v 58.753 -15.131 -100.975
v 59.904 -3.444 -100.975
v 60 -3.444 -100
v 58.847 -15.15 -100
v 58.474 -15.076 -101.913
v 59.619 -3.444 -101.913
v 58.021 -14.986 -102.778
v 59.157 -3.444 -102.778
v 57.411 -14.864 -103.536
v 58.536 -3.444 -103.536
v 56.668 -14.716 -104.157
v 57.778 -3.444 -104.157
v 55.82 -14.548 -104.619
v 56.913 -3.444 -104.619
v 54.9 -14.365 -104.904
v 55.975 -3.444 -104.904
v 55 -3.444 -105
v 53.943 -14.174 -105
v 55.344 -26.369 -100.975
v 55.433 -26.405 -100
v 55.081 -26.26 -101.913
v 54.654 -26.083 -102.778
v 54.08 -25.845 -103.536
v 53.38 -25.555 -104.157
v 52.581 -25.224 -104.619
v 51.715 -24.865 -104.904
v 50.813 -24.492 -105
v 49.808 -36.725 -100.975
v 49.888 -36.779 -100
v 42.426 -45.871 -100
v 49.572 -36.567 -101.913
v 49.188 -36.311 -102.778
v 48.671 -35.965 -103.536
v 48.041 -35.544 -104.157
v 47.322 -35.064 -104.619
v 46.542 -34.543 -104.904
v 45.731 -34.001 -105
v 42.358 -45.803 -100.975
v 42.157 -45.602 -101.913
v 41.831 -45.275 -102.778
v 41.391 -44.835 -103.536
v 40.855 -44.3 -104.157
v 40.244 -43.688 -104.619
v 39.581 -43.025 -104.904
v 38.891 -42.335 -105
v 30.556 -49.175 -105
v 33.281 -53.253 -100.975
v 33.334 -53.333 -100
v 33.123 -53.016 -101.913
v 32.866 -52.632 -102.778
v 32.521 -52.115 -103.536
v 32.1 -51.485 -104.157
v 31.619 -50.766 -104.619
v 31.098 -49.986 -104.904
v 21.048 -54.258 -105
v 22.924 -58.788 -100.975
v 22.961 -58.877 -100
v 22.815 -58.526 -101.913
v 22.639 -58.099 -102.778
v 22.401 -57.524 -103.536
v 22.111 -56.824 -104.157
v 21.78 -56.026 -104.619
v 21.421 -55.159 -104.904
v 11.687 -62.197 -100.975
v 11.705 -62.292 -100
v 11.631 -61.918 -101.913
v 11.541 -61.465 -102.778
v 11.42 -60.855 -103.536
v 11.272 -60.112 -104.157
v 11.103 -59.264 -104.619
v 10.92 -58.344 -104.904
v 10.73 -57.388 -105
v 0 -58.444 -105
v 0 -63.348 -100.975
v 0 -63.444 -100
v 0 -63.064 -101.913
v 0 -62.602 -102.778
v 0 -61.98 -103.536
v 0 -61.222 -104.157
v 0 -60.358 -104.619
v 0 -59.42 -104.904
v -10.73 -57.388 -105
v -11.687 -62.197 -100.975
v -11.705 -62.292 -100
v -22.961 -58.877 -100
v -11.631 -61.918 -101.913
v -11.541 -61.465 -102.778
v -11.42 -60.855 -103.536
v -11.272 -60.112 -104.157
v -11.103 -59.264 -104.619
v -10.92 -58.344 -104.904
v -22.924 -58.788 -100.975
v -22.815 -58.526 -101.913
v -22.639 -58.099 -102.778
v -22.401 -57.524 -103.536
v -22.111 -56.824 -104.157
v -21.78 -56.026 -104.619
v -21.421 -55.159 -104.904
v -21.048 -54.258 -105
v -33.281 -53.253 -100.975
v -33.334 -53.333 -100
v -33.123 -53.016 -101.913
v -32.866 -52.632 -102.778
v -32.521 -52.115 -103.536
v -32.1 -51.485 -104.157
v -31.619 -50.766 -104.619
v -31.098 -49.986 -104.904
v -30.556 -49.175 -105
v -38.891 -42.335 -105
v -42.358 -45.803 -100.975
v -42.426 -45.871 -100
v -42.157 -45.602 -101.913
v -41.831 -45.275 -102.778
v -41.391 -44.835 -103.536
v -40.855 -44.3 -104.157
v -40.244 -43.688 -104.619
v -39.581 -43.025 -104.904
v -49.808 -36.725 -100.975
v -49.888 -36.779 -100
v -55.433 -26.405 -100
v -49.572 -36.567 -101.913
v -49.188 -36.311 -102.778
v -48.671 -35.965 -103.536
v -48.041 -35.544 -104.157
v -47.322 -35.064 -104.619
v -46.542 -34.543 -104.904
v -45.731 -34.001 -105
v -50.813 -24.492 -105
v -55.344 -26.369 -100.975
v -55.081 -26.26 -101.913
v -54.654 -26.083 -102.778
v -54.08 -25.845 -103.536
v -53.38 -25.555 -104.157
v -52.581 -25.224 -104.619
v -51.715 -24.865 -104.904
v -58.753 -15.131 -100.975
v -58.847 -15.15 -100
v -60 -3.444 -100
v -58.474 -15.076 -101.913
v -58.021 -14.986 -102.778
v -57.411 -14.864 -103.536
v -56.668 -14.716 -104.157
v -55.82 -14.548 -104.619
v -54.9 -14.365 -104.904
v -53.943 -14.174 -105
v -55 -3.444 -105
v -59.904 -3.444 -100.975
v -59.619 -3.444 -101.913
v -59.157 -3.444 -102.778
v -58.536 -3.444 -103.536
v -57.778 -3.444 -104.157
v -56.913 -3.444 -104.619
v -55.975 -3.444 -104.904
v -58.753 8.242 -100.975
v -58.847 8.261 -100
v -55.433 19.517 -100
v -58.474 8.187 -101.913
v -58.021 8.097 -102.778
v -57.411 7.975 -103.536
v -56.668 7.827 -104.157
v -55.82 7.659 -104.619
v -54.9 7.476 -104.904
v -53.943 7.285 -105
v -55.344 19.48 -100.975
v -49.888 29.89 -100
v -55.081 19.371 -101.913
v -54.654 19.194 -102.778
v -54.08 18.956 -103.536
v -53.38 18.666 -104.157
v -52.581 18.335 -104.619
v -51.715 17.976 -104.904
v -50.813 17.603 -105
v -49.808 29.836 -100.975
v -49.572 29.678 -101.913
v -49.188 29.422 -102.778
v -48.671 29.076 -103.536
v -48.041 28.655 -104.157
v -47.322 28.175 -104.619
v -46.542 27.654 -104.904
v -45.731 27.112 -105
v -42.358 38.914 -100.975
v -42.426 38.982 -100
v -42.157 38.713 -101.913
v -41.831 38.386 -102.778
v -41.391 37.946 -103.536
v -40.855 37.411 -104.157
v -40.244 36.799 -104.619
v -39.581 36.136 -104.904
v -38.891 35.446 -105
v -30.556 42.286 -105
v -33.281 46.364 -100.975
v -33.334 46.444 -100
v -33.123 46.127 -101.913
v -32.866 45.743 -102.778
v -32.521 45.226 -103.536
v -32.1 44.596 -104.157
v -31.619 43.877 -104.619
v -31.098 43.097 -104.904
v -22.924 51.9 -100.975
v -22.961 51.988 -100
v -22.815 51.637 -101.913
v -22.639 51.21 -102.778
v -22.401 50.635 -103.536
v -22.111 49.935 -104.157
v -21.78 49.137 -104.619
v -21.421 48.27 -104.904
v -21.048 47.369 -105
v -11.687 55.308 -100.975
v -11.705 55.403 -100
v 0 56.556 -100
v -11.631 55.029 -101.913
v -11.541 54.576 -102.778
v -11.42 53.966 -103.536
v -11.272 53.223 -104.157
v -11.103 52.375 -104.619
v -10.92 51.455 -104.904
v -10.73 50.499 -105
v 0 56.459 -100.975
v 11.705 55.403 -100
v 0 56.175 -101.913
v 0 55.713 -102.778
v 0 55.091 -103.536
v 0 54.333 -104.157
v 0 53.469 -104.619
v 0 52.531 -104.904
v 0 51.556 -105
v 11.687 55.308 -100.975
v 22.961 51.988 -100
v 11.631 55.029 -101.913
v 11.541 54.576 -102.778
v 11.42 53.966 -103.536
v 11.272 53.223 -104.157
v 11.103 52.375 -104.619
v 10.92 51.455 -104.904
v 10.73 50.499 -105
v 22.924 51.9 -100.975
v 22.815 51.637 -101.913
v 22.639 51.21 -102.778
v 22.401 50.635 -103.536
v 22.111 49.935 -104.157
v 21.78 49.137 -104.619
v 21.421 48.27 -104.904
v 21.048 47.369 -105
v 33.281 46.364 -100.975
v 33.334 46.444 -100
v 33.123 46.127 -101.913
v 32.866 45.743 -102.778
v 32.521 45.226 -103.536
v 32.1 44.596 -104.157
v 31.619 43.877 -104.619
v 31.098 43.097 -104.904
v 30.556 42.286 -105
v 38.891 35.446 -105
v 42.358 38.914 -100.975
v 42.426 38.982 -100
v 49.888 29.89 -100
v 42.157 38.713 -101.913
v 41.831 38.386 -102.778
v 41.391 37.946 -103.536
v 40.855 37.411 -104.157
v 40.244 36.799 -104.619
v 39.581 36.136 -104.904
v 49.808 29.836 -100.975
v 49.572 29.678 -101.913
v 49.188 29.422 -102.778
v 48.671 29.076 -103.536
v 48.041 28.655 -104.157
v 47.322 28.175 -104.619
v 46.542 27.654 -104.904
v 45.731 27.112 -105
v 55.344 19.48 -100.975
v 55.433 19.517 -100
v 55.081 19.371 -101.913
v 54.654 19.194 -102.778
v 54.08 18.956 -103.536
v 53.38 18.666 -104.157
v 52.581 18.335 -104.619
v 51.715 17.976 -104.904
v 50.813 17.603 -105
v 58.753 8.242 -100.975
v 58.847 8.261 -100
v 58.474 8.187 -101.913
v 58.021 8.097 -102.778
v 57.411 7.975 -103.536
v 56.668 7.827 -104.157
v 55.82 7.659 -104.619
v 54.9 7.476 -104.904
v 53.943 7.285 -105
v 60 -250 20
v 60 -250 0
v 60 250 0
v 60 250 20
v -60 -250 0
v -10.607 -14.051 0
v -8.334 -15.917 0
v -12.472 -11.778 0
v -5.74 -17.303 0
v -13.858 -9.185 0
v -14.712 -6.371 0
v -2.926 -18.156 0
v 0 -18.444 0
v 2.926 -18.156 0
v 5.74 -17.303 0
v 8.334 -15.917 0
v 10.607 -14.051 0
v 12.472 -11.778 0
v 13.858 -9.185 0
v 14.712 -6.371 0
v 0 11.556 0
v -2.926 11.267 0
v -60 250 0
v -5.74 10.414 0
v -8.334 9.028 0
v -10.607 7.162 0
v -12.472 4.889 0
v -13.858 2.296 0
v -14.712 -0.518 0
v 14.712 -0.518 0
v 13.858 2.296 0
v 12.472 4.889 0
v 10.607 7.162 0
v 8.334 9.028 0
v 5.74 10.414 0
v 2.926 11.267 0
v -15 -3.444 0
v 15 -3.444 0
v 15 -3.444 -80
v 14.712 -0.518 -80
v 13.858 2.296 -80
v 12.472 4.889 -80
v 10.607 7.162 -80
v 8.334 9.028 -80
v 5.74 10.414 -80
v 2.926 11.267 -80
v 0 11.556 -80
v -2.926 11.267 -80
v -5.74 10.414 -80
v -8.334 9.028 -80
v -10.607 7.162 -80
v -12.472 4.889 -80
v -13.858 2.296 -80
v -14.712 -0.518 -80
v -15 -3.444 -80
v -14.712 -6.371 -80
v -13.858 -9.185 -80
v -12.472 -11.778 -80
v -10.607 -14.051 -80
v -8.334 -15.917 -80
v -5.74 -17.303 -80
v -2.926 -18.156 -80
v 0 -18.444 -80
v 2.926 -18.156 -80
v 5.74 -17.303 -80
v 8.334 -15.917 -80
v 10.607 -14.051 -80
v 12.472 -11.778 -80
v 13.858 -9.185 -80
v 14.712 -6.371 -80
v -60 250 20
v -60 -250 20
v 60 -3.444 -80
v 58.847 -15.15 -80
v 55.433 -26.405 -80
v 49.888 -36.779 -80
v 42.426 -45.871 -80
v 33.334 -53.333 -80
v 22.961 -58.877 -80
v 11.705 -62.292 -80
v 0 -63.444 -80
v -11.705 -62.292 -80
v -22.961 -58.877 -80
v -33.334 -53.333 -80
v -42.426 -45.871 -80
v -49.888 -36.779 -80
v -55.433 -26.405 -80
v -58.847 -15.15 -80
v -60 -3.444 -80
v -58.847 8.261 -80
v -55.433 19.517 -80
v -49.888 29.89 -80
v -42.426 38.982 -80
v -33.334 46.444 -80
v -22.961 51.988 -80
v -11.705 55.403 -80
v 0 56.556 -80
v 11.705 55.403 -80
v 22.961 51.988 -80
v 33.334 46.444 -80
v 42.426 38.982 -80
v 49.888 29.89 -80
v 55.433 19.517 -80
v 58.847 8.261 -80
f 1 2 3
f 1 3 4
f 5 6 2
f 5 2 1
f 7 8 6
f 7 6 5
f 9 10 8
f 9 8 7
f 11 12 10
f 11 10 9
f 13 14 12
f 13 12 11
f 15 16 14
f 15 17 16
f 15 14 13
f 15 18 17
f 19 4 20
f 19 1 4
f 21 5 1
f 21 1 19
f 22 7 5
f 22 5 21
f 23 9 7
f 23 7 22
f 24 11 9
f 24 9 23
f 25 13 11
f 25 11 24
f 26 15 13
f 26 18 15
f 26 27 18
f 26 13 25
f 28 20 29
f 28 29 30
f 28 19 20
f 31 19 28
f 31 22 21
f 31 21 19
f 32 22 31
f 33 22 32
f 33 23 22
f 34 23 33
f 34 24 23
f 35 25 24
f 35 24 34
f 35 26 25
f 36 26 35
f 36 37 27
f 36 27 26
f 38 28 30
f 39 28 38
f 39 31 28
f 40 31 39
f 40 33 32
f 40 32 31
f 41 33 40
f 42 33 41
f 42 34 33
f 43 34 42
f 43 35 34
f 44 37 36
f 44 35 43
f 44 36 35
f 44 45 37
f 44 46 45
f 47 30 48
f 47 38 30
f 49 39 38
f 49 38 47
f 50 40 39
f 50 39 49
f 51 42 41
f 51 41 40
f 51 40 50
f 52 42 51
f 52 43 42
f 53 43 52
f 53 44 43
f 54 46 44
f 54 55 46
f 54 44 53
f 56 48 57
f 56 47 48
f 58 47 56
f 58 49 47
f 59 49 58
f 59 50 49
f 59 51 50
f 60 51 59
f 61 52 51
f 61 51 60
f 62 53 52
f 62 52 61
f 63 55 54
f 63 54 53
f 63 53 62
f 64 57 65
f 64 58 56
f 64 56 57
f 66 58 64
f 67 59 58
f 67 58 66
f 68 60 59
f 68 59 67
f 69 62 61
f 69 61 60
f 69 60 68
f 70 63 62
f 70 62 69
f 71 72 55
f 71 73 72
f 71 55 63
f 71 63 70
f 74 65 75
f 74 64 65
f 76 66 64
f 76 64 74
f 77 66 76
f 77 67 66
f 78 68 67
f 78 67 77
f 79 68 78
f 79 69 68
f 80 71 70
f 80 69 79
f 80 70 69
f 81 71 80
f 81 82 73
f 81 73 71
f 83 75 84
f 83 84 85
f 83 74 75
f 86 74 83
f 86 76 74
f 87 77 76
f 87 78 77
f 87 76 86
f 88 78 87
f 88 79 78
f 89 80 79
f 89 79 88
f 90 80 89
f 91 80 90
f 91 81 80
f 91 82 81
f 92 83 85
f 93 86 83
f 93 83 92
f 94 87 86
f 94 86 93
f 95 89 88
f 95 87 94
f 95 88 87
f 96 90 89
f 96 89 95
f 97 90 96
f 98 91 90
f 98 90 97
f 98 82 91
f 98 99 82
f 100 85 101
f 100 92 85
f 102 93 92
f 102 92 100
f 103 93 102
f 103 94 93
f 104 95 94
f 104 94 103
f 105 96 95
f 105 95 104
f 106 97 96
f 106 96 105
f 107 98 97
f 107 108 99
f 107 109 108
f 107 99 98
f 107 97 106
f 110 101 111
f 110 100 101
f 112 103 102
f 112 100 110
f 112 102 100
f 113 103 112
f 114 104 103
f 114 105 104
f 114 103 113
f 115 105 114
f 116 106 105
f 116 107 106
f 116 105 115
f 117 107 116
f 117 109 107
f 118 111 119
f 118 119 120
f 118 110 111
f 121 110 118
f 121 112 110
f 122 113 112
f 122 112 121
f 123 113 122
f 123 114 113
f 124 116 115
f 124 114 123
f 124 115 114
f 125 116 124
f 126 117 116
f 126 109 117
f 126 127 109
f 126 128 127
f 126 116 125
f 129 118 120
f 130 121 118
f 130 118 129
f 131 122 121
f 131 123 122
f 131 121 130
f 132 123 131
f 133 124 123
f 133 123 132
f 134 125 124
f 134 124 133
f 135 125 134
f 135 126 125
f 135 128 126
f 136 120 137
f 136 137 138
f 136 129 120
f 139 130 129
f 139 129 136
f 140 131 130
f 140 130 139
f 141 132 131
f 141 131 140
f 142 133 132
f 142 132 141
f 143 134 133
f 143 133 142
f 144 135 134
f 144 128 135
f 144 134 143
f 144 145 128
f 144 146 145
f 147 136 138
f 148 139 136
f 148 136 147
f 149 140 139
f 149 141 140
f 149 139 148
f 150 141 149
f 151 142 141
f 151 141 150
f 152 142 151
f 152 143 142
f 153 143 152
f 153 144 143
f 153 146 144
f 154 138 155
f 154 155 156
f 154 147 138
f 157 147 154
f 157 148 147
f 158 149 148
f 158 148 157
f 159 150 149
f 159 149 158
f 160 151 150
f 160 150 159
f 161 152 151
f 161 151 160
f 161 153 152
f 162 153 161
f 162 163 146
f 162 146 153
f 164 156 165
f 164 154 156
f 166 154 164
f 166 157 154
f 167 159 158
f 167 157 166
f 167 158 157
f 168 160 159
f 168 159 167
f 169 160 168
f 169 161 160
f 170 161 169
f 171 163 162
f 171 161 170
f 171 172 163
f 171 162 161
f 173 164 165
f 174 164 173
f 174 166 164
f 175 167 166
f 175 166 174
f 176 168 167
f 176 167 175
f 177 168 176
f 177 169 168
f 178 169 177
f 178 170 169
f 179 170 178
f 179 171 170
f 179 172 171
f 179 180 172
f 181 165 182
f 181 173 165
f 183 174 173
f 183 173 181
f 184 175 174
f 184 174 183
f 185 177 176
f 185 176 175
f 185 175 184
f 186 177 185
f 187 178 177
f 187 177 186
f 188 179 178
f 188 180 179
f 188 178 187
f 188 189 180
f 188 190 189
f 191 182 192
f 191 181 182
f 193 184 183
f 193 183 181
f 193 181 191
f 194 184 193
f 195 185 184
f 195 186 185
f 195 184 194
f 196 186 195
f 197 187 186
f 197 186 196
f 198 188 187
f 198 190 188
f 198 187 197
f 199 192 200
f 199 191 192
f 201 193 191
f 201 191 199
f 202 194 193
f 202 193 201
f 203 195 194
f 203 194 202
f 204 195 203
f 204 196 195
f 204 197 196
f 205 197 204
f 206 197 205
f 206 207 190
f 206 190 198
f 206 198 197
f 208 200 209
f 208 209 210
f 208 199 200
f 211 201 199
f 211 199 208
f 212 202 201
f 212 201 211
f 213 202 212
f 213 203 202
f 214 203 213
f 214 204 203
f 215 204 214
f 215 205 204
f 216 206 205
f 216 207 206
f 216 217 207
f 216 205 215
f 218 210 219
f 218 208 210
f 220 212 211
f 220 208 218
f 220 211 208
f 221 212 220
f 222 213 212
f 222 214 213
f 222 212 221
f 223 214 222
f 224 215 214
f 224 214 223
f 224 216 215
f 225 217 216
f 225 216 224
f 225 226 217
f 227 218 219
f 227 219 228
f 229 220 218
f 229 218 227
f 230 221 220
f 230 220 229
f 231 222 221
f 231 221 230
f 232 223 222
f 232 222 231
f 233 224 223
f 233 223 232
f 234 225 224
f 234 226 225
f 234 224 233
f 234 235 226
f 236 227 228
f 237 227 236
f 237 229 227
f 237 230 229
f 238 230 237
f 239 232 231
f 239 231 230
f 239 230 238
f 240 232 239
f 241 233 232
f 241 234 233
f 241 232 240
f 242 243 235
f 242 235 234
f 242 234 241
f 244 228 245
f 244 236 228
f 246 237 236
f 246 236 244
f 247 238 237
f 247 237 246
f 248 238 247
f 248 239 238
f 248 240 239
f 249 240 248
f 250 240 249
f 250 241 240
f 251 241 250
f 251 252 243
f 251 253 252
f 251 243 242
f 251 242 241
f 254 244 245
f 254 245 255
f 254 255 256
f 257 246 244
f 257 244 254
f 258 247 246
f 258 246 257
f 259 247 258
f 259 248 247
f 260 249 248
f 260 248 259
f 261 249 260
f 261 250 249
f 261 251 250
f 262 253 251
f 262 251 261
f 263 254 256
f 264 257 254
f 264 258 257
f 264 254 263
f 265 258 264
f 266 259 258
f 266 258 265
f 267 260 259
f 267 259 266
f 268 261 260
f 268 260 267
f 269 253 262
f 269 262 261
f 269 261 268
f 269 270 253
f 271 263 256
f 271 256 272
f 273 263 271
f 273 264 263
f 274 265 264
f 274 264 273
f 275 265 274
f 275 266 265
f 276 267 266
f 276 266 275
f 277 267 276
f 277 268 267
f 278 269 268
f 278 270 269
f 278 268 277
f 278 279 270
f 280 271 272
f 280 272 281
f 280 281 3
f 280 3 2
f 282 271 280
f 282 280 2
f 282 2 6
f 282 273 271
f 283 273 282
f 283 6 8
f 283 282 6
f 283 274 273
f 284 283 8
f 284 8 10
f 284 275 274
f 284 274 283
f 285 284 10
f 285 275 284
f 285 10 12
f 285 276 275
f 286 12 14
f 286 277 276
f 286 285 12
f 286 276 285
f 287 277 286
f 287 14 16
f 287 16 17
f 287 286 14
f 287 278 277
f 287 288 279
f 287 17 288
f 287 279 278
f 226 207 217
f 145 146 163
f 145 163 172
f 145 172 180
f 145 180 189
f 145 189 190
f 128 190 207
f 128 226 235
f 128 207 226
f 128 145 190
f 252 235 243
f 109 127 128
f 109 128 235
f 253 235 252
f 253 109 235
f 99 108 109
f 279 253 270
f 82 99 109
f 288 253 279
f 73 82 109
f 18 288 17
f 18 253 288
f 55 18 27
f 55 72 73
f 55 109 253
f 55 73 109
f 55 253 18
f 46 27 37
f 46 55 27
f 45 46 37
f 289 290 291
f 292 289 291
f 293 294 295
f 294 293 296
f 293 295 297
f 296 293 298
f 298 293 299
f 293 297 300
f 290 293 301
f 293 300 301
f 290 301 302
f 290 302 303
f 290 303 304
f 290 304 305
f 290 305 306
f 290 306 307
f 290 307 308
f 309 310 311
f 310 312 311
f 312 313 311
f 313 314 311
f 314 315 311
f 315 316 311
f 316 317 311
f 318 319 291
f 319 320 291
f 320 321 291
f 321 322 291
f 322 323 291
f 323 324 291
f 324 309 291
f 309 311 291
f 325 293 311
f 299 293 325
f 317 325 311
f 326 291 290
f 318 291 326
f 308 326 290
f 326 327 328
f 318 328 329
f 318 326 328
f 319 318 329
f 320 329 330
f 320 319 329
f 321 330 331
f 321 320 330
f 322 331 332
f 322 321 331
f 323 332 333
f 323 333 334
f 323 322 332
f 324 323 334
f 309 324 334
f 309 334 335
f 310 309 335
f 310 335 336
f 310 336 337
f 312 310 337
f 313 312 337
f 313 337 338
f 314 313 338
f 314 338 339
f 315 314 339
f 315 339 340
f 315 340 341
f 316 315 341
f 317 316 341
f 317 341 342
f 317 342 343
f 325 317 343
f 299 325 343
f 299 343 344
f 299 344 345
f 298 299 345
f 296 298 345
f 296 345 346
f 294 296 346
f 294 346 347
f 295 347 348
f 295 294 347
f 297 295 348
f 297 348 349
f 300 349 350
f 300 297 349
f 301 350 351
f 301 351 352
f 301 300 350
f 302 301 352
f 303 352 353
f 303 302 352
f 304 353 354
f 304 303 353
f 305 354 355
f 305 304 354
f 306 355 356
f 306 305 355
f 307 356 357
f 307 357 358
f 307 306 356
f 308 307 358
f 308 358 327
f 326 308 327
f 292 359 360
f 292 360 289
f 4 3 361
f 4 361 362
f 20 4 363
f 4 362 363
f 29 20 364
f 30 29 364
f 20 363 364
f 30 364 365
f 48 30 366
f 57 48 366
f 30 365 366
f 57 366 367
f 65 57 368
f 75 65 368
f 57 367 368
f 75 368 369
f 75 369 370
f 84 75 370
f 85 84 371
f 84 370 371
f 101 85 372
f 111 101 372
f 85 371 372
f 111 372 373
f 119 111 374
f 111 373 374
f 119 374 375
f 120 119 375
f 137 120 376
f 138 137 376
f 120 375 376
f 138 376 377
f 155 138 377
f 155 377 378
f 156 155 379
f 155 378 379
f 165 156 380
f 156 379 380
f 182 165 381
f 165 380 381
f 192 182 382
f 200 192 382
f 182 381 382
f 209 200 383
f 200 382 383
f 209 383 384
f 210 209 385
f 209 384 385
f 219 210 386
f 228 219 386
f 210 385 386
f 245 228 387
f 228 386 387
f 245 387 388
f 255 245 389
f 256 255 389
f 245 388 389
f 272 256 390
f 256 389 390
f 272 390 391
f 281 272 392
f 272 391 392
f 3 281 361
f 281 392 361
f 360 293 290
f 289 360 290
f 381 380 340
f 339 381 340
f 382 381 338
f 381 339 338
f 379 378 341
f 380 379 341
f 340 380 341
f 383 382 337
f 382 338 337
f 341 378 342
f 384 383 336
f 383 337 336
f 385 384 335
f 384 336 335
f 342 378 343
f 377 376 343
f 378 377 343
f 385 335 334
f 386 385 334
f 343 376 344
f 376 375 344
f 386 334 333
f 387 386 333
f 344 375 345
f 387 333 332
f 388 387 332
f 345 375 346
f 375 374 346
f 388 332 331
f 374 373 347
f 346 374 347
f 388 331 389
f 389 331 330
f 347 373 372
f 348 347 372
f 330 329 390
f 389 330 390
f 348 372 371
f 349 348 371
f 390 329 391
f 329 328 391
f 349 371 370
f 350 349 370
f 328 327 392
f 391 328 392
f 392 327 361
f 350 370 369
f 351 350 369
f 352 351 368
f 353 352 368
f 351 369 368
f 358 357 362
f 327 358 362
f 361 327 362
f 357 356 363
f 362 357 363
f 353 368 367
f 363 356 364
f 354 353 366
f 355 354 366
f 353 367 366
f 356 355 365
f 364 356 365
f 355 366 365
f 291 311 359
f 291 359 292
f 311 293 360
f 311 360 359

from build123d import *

# Parameters (mm, degrees)
F0_W     = 120
F0_H     = 500
F1_DEPTH = 20
F2_R     = 15
F3_DEPTH = 100
F4_R     = 60
F5_DEPTH = 25
F6_R     = 5


with BuildPart() as f1:
    # F0 (on Top) → F1 (new body)
    with BuildSketch(Plane.XY):
        Rectangle(F0_W, F0_H)
    extrude(amount=F1_DEPTH)

    # F2 (on face) → F3 (join)
    with BuildSketch(Plane.XY.offset(20)):
        with Locations((0, -3.444481)):
            Circle(F2_R)
    extrude(amount=-F3_DEPTH)

    # F4 (on face) → F5 (join)
    with BuildSketch(Plane(origin=(0, 0, -80), x_dir=(1, 0, 0), z_dir=(0, 0, -1))):
        with Locations((0, 3.444481)):
            Circle(F4_R)
    extrude(amount=F5_DEPTH)

    # F6
    f6_edges = [f1.edges().sort_by_distance(p)[0] for p in [
        (-60, -3.444481, -105),
    ]]
    fillet(f6_edges, radius=F6_R)


solid = f1.part
